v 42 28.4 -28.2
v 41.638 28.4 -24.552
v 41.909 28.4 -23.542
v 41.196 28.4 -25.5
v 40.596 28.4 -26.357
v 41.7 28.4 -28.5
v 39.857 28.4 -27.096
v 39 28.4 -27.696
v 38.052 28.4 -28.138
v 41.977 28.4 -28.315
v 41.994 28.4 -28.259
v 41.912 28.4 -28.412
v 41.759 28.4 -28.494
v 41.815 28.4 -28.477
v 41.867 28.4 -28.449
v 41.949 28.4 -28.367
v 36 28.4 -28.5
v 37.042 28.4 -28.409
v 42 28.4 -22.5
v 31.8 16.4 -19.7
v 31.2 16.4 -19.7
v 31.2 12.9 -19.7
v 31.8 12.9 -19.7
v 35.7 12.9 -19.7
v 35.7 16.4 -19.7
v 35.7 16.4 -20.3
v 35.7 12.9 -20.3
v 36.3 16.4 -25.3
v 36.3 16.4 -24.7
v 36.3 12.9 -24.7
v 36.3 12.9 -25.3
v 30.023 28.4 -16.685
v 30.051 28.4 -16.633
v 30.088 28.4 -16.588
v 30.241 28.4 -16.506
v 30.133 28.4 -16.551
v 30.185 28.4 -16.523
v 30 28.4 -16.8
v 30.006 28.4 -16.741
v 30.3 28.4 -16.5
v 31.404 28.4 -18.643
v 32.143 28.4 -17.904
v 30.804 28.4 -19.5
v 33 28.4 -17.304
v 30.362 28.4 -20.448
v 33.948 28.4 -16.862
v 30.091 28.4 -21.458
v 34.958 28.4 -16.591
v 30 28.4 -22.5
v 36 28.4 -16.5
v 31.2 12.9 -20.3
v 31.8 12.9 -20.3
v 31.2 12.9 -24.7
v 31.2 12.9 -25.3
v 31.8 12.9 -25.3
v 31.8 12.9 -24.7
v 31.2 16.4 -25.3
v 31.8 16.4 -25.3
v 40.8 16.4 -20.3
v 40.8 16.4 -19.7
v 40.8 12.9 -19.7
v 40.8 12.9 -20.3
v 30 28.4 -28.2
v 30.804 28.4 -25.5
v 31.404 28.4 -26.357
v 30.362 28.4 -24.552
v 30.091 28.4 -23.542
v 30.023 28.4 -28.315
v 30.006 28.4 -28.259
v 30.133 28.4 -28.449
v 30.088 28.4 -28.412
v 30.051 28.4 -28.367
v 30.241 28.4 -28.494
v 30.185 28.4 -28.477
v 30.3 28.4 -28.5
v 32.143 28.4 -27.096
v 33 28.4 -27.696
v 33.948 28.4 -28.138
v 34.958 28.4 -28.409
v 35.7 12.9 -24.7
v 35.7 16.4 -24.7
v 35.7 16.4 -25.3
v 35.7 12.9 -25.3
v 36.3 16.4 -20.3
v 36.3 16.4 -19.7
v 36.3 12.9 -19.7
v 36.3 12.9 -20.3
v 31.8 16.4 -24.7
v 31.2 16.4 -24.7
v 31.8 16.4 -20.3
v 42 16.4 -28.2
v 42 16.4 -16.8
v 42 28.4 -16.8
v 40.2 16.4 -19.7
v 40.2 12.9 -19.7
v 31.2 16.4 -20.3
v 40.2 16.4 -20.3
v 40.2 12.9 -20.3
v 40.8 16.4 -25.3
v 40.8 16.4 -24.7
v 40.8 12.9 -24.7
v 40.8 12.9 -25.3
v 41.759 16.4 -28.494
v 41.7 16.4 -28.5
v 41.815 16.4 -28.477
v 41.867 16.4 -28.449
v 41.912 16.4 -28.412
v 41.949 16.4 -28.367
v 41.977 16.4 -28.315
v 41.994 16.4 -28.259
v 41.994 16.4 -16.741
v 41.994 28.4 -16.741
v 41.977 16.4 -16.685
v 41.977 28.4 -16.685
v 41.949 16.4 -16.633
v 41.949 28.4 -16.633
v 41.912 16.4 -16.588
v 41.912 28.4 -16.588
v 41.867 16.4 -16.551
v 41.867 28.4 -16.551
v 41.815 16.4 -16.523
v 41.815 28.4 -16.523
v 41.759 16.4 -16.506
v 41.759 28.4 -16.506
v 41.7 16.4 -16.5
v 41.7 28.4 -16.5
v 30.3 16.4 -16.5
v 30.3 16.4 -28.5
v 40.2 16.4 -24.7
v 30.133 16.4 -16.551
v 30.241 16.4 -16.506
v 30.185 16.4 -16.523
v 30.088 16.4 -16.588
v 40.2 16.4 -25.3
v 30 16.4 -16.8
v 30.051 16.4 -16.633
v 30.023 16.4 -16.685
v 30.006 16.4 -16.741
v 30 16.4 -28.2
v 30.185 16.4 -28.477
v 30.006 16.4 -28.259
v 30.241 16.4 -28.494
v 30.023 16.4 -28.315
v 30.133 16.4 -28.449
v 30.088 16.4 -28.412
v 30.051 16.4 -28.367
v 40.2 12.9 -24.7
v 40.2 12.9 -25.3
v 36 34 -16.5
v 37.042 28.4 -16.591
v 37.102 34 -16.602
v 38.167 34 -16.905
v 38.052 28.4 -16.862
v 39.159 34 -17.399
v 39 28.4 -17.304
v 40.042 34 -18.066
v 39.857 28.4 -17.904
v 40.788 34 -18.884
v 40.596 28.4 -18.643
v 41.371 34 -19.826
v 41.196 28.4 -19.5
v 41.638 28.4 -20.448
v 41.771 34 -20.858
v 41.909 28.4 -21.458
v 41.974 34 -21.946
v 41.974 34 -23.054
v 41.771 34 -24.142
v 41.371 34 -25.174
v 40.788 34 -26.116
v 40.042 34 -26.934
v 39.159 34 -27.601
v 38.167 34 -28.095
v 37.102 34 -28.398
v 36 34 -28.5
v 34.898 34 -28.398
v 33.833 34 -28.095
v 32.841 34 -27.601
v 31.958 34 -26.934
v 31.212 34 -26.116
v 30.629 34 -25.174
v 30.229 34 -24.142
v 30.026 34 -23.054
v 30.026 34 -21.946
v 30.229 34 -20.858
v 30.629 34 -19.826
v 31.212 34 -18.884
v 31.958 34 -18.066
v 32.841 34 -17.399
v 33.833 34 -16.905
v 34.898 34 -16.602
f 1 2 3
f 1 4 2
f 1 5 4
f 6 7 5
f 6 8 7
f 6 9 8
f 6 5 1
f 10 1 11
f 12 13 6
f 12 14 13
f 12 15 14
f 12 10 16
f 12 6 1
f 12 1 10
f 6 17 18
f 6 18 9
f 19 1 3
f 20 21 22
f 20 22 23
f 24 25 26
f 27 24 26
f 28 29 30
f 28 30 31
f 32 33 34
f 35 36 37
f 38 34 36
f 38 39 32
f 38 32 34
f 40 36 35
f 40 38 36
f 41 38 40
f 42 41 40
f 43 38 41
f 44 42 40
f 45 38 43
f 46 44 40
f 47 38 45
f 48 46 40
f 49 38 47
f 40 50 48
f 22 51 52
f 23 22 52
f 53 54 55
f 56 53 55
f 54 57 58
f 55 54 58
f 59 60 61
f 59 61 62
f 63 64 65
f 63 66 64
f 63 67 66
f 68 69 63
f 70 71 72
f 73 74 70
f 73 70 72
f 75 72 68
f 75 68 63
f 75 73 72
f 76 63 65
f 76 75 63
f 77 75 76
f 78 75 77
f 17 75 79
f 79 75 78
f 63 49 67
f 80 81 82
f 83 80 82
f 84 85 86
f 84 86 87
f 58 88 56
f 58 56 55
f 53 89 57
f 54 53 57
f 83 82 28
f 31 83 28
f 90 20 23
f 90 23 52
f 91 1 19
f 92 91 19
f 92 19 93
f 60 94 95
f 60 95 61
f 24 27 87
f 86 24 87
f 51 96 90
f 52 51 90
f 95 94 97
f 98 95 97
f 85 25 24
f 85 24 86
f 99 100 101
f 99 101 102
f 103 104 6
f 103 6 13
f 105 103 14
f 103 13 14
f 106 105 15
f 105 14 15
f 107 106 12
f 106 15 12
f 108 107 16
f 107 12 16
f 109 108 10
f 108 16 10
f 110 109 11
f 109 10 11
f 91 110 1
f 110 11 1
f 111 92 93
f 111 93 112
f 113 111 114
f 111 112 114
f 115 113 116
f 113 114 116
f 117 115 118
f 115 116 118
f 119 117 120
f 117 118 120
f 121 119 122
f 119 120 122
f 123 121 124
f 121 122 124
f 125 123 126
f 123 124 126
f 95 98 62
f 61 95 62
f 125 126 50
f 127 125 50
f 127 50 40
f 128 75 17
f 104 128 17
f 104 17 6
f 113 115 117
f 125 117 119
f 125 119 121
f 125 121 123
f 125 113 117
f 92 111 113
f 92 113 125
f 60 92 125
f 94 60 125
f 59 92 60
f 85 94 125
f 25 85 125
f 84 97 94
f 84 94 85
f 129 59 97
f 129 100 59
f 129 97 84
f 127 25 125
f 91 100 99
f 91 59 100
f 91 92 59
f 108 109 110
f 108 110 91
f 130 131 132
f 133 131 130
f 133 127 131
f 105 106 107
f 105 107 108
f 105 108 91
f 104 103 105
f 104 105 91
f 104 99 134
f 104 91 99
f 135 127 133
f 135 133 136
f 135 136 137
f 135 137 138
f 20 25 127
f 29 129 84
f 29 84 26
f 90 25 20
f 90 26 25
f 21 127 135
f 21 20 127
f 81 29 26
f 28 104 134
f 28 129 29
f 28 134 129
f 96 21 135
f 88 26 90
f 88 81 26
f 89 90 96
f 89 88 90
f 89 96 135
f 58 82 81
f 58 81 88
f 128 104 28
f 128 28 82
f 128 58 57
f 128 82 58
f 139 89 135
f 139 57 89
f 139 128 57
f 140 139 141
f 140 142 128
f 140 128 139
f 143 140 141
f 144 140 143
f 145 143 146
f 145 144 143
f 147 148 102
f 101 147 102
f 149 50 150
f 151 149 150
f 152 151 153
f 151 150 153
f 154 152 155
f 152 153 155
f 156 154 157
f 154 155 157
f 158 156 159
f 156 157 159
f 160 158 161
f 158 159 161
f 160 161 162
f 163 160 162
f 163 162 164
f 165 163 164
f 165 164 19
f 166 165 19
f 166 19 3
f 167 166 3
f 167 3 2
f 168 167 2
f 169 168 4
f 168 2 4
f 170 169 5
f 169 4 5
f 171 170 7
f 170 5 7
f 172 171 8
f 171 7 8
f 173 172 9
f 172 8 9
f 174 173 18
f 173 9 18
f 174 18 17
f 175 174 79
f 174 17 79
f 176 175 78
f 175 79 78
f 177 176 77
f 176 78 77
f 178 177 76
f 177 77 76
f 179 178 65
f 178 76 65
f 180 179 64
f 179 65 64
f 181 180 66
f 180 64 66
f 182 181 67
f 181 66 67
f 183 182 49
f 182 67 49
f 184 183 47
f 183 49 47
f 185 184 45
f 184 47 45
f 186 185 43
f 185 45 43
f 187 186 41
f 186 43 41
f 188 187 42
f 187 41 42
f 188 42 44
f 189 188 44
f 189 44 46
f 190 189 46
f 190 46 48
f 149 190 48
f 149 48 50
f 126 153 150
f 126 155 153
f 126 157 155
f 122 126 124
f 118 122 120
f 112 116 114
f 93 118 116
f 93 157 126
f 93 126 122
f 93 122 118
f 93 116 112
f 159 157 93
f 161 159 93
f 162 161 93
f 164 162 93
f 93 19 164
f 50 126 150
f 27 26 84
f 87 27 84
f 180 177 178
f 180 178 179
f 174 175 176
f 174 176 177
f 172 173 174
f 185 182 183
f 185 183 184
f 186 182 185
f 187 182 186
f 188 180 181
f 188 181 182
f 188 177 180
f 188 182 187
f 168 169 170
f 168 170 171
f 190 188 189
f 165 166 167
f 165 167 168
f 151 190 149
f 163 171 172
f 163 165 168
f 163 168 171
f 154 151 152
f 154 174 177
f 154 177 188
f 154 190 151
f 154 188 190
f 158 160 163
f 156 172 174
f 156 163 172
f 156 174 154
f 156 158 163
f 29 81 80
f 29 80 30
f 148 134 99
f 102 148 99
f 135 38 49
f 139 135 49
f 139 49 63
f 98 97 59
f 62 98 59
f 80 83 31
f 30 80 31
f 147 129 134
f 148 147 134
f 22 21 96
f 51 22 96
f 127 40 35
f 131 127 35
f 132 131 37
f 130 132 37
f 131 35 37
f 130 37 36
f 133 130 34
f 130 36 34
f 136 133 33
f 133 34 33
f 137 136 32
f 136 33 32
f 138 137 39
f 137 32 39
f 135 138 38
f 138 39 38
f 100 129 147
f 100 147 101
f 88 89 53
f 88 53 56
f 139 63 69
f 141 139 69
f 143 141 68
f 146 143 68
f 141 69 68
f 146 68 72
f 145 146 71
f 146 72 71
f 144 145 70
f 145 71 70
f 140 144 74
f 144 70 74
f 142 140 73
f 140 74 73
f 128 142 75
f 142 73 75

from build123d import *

# Parameters (mm, degrees)
BODY_DEPTH = 12
PINS_SK2_W = 0.6
PINS_SK2_H = 0.6
PINS_DEPTH = 15.5
CAP_SK3_R  = 6
CAP_DEPTH  = 5.6


with BuildPart() as part:
    # Body_Sk1 → Body (new body)
    with BuildSketch(Plane(origin=(0, 28.4, 0), x_dir=(1, 0, 0), z_dir=(0, 1, 0))):
        with BuildLine():
            Line((30.3, 28.5), (41.7, 28.5))
            ThreePointArc((41.7, 28.5), (41.912132034, 28.412132034), (42, 28.2))
            Line((42, 28.2), (42, 16.8))
            ThreePointArc((42, 16.8), (41.912132034, 16.587867966), (41.7, 16.5))
            Line((41.7, 16.5), (30.3, 16.5))
            ThreePointArc((30.3, 16.5), (30.087867966, 16.587867966), (30, 16.8))
            Line((30, 16.8), (30, 28.2))
            ThreePointArc((30, 28.2), (30.087867966, 28.412132034), (30.3, 28.5))
        make_face()
    extrude(amount=-BODY_DEPTH)

    # Pins_Sk2 → Pins (add)
    with BuildSketch(Plane(origin=(0, 28.4, 0), x_dir=(1, 0, 0), z_dir=(0, 1, 0))):
        with Locations((31.5, 25)):
            Rectangle(PINS_SK2_W, PINS_SK2_H)
        with Locations((31.5, 20)):
            Rectangle(PINS_SK2_W, PINS_SK2_H)
        with Locations((36, 25)):
            Rectangle(PINS_SK2_W, PINS_SK2_H)
        with Locations((36, 20)):
            Rectangle(PINS_SK2_W, PINS_SK2_H)
        with Locations((40.5, 25)):
            Rectangle(PINS_SK2_W, PINS_SK2_H)
        with Locations((40.5, 20)):
            Rectangle(PINS_SK2_W, PINS_SK2_H)
    extrude(amount=-PINS_DEPTH)

    # Cap_Sk3 → Cap (add)
    with BuildSketch(Plane(origin=(0, 28.4, 0), x_dir=(1, 0, 0), z_dir=(0, 1, 0))):
        with Locations(Location((36, 22.5, 0), (0, 0, 270))):
            Circle(CAP_SK3_R)
    extrude(amount=CAP_DEPTH)


solid = part.part
